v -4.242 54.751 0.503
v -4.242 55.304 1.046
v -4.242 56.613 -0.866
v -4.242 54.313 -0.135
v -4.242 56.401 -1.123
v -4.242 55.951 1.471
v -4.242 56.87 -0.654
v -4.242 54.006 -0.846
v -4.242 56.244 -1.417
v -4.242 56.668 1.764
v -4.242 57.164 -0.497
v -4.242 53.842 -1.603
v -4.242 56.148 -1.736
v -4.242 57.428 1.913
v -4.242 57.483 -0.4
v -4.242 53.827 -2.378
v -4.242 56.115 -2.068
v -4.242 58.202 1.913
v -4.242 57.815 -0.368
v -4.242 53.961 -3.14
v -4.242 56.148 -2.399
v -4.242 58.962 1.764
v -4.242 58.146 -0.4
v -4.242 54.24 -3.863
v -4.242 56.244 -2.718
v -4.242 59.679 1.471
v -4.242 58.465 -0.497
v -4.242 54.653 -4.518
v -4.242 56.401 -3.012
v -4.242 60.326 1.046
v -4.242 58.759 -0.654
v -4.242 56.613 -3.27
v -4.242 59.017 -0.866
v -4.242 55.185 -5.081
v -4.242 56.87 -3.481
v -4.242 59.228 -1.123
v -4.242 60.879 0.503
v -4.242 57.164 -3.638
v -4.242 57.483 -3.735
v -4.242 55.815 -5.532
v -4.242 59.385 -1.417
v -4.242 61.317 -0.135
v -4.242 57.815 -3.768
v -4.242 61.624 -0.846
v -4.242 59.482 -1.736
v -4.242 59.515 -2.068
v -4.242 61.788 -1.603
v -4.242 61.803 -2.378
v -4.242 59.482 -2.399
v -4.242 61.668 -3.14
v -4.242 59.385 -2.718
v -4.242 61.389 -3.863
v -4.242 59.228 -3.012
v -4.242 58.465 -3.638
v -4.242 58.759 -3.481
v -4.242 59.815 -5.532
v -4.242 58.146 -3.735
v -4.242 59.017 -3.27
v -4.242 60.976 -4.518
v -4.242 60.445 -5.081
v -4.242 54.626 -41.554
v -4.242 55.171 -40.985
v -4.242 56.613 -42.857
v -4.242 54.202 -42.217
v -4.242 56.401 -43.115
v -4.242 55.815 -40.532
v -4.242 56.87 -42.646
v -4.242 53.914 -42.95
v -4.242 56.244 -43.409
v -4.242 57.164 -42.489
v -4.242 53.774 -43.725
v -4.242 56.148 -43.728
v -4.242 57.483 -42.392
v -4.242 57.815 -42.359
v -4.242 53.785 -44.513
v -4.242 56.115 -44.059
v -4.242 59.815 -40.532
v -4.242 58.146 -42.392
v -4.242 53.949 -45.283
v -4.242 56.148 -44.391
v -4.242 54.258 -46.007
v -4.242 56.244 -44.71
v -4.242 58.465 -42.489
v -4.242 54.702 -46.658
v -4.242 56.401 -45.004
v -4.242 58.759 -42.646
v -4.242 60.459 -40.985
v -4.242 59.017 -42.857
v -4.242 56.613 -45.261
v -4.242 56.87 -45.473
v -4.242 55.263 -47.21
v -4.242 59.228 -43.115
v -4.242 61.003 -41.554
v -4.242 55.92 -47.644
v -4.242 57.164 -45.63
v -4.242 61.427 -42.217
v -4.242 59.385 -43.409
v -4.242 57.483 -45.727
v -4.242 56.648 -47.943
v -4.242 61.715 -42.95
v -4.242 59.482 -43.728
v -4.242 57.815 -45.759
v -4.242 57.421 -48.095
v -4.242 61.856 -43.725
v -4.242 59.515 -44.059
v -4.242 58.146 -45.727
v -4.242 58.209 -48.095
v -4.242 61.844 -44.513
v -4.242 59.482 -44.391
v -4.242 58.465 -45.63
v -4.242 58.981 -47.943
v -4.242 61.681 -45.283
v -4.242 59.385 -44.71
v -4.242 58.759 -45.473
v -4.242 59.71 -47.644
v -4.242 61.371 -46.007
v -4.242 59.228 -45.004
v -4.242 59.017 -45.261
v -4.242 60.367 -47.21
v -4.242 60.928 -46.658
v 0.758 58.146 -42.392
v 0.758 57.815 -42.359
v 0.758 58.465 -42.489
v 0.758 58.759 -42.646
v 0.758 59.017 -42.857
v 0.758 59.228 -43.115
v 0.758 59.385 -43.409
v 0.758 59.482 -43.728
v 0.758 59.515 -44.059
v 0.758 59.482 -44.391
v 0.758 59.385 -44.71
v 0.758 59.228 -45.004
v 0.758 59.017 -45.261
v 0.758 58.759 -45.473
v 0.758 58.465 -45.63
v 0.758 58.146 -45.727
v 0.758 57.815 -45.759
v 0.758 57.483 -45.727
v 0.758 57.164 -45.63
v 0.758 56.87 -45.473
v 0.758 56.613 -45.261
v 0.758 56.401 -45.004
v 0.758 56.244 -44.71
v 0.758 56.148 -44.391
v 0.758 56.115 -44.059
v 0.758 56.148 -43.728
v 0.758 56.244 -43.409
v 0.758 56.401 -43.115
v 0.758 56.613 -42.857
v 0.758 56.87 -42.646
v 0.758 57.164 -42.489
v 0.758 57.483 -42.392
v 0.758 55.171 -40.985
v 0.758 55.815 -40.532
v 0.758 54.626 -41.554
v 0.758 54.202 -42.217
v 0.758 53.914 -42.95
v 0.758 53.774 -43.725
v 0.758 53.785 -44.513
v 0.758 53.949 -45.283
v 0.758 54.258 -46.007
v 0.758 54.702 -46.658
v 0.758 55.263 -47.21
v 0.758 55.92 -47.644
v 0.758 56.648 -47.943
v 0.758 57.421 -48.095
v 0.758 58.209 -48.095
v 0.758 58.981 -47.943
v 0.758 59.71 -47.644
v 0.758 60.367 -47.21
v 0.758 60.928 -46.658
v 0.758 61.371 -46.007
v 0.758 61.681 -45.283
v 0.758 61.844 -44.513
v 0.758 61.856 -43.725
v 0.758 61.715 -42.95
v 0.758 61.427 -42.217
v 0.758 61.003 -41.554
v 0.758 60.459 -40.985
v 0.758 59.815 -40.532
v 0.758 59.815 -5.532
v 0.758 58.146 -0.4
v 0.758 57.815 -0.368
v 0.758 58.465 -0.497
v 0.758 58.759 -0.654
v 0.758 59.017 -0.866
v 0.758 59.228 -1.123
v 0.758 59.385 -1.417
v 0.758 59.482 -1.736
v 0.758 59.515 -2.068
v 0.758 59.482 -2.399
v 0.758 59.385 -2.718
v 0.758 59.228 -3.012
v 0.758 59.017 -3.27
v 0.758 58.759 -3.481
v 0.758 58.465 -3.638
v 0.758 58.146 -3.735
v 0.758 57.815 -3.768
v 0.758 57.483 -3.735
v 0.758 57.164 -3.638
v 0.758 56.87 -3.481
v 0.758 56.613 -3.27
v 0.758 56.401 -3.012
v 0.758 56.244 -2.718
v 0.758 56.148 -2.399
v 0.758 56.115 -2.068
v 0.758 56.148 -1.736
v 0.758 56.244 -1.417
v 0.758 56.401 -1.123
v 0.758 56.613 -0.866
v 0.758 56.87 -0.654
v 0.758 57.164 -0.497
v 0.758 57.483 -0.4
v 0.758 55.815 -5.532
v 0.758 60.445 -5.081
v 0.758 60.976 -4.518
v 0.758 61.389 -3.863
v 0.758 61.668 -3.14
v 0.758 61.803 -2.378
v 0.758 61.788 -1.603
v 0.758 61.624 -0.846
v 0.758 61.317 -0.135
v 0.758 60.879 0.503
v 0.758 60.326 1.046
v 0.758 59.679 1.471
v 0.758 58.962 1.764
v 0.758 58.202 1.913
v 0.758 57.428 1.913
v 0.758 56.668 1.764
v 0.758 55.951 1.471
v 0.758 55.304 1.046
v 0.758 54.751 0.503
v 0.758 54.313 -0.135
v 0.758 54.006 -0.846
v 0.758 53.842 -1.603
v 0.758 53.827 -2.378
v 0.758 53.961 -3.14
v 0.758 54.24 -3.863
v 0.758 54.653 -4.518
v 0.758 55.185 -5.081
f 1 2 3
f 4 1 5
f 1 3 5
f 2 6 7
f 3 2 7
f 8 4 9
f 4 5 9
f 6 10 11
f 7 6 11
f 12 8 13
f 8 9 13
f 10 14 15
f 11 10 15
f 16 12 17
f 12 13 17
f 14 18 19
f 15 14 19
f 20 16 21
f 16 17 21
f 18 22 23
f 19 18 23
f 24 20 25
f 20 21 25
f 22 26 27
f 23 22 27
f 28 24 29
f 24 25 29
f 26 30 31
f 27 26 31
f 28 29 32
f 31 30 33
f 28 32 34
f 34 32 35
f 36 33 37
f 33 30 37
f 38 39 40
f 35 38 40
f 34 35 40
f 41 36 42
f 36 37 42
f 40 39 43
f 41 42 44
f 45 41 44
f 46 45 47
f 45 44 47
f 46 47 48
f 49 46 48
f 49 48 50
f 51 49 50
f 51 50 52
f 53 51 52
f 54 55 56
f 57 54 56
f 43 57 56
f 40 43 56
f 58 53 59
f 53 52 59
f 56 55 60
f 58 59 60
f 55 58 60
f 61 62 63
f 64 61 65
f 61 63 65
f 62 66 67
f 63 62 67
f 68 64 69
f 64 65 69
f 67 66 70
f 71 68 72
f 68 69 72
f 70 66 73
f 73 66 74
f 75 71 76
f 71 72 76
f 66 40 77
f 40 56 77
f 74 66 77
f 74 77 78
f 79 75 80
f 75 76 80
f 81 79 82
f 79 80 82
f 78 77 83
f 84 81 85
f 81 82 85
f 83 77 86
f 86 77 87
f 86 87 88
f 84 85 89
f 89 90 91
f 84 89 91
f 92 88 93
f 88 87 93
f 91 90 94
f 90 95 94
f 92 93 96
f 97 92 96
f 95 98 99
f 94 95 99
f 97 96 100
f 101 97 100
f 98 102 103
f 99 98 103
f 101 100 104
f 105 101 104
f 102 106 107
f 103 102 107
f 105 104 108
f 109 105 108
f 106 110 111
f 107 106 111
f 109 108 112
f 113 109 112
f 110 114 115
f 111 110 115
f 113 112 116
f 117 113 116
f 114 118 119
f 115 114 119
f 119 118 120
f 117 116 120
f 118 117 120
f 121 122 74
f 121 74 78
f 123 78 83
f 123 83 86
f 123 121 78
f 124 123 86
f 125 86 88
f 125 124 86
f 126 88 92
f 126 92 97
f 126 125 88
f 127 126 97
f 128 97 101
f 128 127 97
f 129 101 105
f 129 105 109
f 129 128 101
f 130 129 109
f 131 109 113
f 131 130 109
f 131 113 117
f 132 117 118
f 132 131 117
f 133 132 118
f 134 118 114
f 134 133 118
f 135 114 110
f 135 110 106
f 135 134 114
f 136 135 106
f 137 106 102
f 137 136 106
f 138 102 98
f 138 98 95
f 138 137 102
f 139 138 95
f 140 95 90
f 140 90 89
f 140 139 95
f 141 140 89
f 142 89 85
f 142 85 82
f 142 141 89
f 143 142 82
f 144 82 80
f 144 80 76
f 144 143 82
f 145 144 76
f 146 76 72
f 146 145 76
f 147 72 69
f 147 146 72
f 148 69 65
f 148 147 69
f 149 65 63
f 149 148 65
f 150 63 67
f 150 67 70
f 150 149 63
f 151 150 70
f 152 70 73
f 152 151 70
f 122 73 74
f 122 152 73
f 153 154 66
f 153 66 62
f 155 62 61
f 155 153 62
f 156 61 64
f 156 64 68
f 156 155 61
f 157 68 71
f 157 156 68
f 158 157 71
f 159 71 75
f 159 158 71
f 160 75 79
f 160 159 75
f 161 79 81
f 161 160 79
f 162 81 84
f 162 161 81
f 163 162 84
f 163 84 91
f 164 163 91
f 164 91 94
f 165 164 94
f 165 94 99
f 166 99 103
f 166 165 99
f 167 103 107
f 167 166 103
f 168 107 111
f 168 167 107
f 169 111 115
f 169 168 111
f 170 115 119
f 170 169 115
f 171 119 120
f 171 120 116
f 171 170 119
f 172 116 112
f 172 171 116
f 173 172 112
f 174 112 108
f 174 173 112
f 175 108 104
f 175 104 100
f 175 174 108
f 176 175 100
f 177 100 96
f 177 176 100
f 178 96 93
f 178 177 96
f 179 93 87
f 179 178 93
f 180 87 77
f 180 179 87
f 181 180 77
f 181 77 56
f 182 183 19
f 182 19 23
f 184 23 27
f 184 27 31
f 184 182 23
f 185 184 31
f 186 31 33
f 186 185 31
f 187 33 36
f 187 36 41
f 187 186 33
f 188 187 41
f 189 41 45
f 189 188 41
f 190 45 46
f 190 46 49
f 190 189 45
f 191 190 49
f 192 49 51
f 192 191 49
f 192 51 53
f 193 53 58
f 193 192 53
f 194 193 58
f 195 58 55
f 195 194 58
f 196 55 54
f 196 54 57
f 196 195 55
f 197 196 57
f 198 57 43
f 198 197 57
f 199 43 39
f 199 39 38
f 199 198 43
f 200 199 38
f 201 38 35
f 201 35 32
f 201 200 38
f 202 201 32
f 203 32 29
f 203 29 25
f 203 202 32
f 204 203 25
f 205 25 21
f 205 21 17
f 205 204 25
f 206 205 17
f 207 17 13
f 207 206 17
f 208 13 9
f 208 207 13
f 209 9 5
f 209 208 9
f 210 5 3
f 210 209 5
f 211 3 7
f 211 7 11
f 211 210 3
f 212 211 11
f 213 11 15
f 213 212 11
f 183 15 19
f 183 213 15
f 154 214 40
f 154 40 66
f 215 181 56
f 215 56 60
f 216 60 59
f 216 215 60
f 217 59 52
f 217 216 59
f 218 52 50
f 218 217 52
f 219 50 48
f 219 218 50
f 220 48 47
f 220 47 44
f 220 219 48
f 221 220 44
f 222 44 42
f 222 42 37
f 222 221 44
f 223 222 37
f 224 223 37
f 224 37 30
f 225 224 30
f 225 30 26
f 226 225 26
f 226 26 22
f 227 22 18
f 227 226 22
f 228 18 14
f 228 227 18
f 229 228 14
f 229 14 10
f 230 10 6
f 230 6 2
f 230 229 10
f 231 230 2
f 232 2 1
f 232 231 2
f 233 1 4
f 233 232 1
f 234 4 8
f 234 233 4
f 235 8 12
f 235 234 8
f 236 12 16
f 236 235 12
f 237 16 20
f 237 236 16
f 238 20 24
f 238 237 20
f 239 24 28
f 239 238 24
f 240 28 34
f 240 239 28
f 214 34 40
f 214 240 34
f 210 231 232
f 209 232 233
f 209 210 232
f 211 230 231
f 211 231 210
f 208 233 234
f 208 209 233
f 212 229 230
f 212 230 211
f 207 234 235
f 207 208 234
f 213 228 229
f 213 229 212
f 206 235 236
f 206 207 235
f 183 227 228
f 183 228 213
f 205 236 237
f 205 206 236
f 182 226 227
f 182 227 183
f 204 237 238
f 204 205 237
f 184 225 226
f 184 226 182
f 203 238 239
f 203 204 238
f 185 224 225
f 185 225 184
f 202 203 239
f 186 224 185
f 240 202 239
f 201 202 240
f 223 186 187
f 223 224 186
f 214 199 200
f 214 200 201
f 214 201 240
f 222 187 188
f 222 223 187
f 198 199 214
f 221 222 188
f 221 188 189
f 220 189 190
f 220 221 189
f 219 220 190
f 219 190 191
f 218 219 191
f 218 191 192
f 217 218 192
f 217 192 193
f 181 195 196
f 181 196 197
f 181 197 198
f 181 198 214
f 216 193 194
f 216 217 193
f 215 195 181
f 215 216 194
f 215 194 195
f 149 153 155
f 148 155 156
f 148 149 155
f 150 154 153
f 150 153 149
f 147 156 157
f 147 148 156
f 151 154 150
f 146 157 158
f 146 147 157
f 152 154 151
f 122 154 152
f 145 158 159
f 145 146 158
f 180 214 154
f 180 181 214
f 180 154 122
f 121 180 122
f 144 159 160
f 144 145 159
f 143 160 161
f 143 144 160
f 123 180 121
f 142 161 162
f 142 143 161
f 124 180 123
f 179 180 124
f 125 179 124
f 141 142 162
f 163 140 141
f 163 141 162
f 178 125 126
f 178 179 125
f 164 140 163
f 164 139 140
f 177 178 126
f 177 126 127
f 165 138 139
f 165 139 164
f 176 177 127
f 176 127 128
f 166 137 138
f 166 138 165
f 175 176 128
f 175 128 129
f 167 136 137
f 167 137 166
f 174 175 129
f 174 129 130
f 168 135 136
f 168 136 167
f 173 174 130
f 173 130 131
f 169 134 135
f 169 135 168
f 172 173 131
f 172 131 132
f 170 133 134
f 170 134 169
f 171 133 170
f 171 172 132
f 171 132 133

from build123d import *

# Parameters (mm, degrees)
SKETCH_1_R      = 1.7
EXTRUDE_1_DEPTH = 5


with BuildPart() as part:
    # Эскиз1 → Бобышка-Вытянуть1 (new body)
    with BuildSketch(Plane.ZY.offset(-0.758160047)):
        with BuildLine():
            Line((-40.531827395, 59.814835282), (-5.531827395, 59.814835282))
            ThreePointArc((-5.531827395, 59.814835282), (1.93227422, 57.814835282), (-5.531827395, 55.814835282))
            Line((-5.531827395, 55.814835282), (-40.531827395, 55.814835282))
            ThreePointArc((-40.531827395, 55.814835282), (-48.114294617, 57.814835282), (-40.531827395, 59.814835282))
        make_face()
        with Locations((-2.06772578, 57.814835282)):
            Circle(SKETCH_1_R, mode=Mode.SUBTRACT)
        with Locations((-44.059294617, 57.814835282)):
            Circle(SKETCH_1_R, mode=Mode.SUBTRACT)
    extrude(amount=EXTRUDE_1_DEPTH)


solid = part.part
